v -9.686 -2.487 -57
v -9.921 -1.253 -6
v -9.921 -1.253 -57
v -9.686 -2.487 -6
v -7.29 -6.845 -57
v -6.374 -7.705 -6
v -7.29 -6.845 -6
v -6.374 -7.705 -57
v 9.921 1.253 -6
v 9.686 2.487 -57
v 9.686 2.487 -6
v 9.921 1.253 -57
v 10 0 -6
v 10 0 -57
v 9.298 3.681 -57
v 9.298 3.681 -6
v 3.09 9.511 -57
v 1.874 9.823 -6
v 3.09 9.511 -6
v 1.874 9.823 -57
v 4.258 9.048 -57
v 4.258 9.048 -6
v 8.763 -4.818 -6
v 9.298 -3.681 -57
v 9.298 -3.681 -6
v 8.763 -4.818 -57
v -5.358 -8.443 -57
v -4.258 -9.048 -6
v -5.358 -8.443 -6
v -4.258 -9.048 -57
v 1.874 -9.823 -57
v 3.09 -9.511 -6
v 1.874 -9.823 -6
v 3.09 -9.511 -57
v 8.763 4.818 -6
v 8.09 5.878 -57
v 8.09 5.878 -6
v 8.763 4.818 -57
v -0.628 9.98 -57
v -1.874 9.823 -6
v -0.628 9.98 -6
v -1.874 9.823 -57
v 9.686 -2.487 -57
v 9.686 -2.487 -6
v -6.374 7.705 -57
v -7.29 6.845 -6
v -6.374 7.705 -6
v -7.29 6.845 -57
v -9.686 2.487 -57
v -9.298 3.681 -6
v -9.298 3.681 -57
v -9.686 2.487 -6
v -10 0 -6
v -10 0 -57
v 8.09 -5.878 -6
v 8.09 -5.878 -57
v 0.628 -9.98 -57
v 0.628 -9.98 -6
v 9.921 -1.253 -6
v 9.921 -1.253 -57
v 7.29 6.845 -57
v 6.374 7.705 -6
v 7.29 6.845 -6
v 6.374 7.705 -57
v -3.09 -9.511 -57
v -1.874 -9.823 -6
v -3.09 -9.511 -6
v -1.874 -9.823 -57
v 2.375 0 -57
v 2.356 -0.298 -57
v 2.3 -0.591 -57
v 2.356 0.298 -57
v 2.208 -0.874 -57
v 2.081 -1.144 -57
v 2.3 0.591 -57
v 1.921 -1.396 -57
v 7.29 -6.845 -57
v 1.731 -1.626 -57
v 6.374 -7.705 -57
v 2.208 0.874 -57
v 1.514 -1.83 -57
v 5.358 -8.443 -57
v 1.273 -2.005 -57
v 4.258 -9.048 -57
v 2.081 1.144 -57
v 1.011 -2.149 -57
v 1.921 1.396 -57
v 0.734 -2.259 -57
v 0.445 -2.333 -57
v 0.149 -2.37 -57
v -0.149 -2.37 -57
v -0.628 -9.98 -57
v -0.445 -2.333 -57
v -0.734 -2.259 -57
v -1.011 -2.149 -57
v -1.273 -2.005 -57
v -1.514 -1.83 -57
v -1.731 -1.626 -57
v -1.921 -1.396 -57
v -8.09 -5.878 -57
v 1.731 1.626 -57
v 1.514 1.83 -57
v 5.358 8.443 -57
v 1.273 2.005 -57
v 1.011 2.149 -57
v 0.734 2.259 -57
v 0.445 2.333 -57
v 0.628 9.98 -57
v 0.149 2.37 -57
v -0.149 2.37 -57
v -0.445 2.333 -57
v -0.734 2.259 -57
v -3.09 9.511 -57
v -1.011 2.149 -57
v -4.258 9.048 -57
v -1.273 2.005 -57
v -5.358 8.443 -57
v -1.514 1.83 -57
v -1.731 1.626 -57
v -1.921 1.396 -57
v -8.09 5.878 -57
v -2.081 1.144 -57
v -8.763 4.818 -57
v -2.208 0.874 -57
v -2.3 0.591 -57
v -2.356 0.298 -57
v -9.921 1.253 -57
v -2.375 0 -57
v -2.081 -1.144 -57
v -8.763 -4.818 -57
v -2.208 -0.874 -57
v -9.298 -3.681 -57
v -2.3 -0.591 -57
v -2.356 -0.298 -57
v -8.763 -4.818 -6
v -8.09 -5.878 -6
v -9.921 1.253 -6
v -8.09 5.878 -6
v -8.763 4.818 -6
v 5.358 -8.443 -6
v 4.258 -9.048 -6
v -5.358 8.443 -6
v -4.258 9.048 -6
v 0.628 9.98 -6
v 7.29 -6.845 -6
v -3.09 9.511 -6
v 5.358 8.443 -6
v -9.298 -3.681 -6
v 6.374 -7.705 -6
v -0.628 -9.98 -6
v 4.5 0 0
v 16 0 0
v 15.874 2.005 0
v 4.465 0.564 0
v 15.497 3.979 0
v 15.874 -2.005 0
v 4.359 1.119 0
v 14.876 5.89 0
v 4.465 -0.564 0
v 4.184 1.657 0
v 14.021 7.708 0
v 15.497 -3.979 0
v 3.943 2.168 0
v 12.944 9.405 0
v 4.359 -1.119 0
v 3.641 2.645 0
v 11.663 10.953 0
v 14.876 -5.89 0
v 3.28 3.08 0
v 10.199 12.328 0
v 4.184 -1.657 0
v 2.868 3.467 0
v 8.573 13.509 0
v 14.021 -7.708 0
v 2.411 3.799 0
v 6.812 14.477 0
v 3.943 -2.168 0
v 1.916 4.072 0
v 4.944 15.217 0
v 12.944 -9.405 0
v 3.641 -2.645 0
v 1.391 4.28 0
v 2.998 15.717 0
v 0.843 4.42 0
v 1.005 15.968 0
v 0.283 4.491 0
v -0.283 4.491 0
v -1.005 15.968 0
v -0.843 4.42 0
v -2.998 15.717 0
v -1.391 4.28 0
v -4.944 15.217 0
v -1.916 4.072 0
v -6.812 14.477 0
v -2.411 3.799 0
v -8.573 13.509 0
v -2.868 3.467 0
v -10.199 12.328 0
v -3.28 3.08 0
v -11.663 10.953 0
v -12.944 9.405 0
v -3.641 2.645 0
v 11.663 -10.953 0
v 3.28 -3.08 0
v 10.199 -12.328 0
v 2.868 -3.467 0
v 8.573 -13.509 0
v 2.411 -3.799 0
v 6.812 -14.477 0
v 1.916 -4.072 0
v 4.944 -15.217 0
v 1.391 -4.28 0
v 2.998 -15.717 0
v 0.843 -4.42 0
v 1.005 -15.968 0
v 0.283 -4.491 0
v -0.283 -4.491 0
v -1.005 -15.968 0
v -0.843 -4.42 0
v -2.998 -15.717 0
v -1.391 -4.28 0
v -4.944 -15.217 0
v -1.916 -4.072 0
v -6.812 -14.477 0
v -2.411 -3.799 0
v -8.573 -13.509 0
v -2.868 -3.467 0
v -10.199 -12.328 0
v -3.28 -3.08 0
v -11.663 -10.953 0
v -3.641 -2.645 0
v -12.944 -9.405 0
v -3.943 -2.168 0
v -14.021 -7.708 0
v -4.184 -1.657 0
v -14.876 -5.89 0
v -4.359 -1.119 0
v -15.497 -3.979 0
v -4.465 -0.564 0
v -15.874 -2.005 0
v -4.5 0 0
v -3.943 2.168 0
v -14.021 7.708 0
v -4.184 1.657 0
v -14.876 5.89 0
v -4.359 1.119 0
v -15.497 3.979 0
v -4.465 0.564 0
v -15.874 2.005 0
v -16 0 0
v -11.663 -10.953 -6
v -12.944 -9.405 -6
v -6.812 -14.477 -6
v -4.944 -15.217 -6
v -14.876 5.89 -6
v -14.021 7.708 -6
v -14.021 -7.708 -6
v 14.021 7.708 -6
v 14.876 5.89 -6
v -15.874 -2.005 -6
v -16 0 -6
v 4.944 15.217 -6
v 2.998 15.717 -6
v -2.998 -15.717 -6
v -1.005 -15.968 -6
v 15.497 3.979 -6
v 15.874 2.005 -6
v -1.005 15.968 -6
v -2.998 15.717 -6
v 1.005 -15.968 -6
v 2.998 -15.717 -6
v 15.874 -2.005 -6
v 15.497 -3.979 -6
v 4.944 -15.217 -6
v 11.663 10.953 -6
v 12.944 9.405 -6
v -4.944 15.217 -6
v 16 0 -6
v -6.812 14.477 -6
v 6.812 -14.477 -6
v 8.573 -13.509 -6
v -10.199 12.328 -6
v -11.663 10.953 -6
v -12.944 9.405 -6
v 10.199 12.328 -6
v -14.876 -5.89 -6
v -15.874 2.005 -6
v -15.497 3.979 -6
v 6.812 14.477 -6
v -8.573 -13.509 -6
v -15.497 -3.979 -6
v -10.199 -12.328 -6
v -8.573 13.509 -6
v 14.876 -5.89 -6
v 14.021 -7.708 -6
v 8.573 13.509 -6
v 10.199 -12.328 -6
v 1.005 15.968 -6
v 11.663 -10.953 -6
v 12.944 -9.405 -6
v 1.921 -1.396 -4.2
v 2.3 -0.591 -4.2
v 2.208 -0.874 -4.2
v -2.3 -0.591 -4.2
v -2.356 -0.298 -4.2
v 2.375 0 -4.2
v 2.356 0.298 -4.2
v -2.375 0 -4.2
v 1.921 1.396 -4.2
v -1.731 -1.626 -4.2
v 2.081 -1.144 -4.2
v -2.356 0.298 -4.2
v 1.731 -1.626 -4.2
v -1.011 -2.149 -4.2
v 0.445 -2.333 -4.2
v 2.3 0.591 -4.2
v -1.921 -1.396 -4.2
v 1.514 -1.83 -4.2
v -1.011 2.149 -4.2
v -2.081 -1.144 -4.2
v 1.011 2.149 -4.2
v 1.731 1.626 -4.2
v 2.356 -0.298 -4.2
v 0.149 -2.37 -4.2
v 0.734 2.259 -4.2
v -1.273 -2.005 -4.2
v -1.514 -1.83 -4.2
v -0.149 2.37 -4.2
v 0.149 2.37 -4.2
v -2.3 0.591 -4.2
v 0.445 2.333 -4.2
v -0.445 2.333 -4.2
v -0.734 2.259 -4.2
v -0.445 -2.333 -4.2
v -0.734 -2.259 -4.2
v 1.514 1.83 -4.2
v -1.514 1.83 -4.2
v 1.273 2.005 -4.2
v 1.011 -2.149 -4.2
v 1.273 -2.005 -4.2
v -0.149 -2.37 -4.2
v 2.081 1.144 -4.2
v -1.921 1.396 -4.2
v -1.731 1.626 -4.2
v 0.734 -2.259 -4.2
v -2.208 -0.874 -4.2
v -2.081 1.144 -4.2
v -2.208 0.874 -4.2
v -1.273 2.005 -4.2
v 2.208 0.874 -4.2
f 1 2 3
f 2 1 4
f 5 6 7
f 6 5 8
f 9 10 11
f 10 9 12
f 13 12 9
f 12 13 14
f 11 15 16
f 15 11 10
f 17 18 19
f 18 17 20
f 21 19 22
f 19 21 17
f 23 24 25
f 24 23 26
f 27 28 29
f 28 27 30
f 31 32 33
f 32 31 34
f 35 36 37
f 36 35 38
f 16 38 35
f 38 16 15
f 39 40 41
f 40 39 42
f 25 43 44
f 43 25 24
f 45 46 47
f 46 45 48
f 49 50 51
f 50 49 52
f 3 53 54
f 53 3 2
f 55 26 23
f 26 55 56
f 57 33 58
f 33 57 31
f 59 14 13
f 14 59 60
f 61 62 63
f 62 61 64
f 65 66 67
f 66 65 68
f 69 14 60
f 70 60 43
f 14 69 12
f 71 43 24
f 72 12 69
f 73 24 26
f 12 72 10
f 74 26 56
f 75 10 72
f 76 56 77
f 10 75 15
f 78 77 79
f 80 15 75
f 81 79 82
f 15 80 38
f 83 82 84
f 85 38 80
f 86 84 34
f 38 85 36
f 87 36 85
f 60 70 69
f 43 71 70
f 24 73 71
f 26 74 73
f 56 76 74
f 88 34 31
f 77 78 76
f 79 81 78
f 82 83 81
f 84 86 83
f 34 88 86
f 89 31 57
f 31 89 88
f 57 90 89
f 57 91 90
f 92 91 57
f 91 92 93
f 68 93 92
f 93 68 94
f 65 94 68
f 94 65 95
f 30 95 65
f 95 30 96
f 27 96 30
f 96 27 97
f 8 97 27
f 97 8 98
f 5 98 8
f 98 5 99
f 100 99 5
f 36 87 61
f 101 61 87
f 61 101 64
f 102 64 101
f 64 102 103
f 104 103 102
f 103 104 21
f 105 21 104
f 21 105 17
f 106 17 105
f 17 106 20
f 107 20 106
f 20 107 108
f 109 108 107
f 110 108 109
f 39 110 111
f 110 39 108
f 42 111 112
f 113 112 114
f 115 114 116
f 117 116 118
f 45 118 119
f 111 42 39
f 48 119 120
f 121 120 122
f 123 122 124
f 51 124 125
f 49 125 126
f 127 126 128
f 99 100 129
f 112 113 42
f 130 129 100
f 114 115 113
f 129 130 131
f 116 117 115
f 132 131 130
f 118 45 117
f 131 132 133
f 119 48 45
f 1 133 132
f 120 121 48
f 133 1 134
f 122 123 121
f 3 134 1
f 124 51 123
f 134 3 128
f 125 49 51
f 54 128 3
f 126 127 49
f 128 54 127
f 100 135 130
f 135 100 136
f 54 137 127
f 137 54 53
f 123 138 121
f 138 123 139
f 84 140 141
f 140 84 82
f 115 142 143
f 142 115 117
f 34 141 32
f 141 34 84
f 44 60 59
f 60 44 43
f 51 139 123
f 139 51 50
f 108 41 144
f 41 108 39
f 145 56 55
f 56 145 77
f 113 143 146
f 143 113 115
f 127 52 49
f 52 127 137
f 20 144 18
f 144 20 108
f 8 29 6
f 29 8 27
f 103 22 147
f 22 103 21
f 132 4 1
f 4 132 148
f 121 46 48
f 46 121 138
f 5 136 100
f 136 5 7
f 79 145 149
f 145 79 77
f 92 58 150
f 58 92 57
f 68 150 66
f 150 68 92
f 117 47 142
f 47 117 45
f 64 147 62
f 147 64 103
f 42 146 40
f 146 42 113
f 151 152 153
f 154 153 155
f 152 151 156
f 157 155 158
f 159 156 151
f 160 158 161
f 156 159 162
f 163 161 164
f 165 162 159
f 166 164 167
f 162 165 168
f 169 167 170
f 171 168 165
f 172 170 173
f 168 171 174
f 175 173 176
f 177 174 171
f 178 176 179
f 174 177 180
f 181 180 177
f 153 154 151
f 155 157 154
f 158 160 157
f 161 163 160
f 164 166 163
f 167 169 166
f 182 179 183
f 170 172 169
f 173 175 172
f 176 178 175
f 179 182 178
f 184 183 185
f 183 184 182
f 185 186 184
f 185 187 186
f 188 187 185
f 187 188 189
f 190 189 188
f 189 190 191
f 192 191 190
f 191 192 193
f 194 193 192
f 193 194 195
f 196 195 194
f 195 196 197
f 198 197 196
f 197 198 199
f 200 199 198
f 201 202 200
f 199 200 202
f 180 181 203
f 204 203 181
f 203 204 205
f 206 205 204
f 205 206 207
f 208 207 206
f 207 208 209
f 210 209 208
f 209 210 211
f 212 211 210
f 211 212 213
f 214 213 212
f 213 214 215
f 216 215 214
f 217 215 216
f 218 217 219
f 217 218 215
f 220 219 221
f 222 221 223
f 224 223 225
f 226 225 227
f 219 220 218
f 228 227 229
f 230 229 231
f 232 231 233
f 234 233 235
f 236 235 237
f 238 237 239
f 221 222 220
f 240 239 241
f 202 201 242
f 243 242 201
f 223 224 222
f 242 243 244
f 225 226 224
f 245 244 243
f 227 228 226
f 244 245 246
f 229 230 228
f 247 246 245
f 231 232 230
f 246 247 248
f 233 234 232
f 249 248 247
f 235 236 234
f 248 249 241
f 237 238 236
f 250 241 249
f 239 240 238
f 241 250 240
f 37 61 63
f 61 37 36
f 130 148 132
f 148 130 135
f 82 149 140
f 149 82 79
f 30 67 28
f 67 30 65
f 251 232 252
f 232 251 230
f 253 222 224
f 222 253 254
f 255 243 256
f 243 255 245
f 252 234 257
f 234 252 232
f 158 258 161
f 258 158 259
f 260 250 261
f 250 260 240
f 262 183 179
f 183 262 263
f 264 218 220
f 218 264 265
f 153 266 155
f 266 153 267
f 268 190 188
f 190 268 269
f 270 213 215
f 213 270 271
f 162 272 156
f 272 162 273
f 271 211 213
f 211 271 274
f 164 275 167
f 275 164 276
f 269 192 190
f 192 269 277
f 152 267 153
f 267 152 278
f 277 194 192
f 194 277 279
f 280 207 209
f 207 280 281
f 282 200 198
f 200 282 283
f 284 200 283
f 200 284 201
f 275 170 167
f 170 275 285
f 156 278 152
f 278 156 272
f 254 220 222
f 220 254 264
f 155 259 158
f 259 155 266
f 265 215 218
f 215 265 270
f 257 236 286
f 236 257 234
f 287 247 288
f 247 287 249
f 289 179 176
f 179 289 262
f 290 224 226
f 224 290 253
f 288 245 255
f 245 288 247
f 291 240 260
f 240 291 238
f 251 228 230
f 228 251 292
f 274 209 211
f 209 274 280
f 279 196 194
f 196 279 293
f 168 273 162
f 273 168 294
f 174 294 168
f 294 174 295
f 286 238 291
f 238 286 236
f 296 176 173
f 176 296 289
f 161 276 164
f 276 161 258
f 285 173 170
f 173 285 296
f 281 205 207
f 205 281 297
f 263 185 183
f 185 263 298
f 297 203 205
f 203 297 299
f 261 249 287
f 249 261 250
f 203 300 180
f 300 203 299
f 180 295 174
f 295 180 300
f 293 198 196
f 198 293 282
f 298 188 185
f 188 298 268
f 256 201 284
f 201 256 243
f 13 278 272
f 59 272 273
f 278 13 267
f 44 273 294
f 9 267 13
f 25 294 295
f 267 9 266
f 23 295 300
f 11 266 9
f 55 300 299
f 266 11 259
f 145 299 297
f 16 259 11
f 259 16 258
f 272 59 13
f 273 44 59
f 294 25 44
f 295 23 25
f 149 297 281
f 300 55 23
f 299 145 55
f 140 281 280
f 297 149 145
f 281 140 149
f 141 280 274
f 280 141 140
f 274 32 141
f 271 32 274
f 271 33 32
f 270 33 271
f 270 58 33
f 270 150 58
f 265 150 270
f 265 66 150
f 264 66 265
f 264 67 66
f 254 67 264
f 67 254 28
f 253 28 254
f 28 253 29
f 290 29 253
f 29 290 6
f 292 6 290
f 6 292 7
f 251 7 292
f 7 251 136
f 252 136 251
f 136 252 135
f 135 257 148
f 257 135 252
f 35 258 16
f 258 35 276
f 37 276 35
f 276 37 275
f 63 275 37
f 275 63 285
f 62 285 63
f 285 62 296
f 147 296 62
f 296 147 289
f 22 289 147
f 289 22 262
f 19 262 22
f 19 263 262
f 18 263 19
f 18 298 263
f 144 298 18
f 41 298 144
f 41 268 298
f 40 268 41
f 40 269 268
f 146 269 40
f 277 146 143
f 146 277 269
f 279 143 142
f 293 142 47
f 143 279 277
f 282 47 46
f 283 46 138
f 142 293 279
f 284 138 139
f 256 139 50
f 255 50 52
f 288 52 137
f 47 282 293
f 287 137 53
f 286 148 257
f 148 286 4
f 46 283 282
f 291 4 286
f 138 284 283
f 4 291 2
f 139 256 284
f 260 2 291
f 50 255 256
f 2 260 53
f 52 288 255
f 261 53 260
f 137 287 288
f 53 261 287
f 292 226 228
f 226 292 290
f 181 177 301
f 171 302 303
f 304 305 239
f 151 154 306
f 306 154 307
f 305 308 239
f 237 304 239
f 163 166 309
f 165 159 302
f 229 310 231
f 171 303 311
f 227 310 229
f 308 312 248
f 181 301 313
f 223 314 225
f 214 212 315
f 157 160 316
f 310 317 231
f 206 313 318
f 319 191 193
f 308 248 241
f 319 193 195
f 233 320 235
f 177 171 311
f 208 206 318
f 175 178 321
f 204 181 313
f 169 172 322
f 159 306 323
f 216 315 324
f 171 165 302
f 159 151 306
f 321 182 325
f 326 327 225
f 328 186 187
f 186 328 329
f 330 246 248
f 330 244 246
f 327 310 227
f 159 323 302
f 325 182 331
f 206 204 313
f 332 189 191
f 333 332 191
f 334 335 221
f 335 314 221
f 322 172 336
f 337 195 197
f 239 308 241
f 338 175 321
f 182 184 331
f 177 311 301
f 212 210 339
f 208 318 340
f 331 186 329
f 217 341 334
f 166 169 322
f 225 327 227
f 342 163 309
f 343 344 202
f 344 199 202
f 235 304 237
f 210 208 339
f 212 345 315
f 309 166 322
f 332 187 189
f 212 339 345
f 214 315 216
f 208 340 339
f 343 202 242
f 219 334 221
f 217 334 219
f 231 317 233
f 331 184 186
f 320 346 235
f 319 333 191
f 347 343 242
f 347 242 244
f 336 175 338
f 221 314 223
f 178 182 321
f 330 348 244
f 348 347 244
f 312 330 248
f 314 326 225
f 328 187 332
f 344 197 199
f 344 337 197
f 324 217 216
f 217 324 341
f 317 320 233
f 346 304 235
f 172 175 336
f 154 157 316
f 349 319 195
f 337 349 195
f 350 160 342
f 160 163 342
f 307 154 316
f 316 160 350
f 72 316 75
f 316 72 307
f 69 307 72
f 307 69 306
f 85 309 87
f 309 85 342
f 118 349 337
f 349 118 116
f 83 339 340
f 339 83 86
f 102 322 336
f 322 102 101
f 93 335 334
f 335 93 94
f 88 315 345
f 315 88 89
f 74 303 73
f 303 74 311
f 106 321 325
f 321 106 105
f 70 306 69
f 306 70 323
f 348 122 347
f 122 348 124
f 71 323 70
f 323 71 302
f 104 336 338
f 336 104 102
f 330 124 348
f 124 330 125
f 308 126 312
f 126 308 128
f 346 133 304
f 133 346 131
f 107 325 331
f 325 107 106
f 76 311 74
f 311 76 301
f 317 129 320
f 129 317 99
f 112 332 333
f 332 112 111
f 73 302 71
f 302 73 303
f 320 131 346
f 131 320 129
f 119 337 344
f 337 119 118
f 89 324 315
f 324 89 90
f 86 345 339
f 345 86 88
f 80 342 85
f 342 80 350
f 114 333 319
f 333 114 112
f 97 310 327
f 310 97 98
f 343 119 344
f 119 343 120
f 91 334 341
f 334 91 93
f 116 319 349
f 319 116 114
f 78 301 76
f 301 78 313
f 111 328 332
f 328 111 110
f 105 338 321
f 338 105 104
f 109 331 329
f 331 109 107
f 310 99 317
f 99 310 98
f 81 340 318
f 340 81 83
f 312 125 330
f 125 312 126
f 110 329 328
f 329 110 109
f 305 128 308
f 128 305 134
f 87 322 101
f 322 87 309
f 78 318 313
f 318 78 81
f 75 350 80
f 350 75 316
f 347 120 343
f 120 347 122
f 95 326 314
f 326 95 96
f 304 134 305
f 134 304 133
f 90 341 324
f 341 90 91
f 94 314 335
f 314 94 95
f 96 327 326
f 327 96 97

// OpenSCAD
$fn = 50;


difference() {
	union() {
		translate(v = [0, 0, -57.0000000000]) {
			cylinder(h = 57, r = 10.0000000000);
		}
		translate(v = [0, 0, -6.0000000000]) {
			cylinder(h = 6, r = 16.0000000000);
		}
	}
	union() {
		translate(v = [0, 0, 0]) {
			rotate(a = [0, 0, 0]) {
				difference() {
					union() {
						#translate(v = [0, 0, -57.0000000000]) {
							cylinder(h = 57, r = 2.2500000000);
						}
						#translate(v = [0, 0, -4.2000000000]) {
							cylinder(h = 4.2000000000, r1 = 2.3750000000, r2 = 4.5000000000);
						}
						#translate(v = [0, 0, -57.0000000000]) {
							cylinder(h = 57, r = 2.3750000000);
						}
						#translate(v = [0, 0, -57.0000000000]) {
							cylinder(h = 57, r = 2.2500000000);
						}
					}
					union();
				}
			}
		}
	}
}
